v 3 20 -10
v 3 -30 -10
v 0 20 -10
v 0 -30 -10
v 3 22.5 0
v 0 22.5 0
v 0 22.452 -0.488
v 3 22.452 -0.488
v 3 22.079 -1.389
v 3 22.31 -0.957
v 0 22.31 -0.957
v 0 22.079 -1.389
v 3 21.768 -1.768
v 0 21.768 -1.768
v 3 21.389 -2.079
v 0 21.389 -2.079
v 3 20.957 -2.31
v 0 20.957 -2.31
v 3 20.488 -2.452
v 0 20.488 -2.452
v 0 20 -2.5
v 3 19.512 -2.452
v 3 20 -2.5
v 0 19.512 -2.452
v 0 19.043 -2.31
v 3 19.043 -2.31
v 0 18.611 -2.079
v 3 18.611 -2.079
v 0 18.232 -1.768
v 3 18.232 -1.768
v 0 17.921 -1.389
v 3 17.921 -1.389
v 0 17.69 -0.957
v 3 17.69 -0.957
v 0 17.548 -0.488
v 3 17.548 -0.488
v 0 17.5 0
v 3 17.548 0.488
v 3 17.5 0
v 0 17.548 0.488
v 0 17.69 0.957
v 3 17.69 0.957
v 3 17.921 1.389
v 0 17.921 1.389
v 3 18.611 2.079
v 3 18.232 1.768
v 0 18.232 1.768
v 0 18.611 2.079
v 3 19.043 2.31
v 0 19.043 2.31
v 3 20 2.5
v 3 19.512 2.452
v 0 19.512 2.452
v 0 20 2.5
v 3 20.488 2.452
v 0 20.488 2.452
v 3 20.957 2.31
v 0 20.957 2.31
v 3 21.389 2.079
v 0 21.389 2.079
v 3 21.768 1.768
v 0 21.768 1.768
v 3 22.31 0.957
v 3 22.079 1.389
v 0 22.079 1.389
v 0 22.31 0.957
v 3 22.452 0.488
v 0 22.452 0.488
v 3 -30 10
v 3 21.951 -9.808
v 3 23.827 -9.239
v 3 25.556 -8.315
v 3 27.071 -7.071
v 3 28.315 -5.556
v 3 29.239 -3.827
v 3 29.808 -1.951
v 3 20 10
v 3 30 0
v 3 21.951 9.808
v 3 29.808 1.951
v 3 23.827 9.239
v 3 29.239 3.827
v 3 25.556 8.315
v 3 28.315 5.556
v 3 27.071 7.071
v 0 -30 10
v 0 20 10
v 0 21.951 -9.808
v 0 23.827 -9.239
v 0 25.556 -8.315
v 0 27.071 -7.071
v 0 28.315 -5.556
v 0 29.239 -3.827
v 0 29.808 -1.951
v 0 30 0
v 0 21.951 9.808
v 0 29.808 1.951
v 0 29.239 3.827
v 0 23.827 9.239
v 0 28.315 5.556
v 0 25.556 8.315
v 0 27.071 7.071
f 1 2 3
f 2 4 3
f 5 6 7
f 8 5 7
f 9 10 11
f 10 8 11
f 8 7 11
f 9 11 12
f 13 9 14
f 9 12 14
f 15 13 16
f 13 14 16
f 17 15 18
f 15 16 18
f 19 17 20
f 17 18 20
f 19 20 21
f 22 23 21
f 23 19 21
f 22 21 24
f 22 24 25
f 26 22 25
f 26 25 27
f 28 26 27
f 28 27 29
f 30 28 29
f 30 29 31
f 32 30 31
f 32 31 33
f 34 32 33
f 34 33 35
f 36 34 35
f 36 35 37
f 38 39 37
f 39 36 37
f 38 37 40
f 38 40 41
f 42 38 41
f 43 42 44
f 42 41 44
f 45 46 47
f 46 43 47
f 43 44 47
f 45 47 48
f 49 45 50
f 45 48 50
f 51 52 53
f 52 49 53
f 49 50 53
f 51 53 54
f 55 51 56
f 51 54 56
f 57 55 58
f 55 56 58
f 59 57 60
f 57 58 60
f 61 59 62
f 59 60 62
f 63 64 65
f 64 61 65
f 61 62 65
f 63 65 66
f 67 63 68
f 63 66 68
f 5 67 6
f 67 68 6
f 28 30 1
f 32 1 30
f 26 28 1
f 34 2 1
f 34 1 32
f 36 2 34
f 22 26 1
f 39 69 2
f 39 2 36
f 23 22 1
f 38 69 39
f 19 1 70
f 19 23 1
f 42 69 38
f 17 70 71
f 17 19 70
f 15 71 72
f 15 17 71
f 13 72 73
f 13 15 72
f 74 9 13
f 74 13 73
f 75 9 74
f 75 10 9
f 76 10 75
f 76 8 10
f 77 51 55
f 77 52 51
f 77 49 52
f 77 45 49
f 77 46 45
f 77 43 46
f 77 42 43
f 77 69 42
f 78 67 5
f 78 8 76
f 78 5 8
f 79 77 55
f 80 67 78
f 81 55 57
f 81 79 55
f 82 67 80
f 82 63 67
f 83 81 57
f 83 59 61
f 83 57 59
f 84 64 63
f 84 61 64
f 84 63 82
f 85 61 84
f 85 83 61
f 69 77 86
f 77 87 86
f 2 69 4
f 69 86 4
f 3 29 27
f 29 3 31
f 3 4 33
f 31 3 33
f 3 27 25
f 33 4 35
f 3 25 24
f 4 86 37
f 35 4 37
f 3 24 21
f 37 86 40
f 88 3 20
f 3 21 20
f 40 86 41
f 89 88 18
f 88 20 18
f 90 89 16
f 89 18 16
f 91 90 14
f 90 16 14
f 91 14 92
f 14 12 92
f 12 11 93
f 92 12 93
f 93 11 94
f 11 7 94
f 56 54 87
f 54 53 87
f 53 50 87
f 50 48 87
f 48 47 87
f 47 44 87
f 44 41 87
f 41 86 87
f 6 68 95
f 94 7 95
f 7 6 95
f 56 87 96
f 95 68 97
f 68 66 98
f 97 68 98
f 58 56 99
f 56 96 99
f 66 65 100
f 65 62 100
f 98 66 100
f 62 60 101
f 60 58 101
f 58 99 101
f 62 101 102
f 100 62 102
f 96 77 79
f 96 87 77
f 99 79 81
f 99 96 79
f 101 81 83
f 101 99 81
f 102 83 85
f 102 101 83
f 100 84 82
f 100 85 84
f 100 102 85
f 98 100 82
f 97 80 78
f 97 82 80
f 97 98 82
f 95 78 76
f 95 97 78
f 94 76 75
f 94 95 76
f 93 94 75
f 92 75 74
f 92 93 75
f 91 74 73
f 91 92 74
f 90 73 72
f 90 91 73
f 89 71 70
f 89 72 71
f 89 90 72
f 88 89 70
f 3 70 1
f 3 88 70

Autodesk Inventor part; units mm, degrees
ref_plane "YZ Plane" through (0, 0, 0) normal (1, 0, 0) x (0, 1, 0)
ref_plane "XZ Plane" through (0, 0, 0) normal (0, 1, 0) x (-1, 0, 0)
ref_plane "XY Plane" through (0, 0, 0) normal (0, 0, 1) x (1, 0, 0)
sketch "Sketch1" plane through (0, 0, 0) normal (1, 0, 0) x (0, 1, 0)
  line L0 (20, 10) -> (-30, 10)
  line L1 (-30, 10) -> (-30, -10)
  line L2 (-30, -10) -> (20, -10)
  arc A0 (20, -10) -> (20, 10) centre (20, 0) ccw
  circle A1 centre (20, 0) radius 2.5
  point P0 (0, 0)
extrude "Extrusion1" add sketch "Sketch1" along normal blind 3
properties part number "Conveyor Stand" material "Pine, Southern"
